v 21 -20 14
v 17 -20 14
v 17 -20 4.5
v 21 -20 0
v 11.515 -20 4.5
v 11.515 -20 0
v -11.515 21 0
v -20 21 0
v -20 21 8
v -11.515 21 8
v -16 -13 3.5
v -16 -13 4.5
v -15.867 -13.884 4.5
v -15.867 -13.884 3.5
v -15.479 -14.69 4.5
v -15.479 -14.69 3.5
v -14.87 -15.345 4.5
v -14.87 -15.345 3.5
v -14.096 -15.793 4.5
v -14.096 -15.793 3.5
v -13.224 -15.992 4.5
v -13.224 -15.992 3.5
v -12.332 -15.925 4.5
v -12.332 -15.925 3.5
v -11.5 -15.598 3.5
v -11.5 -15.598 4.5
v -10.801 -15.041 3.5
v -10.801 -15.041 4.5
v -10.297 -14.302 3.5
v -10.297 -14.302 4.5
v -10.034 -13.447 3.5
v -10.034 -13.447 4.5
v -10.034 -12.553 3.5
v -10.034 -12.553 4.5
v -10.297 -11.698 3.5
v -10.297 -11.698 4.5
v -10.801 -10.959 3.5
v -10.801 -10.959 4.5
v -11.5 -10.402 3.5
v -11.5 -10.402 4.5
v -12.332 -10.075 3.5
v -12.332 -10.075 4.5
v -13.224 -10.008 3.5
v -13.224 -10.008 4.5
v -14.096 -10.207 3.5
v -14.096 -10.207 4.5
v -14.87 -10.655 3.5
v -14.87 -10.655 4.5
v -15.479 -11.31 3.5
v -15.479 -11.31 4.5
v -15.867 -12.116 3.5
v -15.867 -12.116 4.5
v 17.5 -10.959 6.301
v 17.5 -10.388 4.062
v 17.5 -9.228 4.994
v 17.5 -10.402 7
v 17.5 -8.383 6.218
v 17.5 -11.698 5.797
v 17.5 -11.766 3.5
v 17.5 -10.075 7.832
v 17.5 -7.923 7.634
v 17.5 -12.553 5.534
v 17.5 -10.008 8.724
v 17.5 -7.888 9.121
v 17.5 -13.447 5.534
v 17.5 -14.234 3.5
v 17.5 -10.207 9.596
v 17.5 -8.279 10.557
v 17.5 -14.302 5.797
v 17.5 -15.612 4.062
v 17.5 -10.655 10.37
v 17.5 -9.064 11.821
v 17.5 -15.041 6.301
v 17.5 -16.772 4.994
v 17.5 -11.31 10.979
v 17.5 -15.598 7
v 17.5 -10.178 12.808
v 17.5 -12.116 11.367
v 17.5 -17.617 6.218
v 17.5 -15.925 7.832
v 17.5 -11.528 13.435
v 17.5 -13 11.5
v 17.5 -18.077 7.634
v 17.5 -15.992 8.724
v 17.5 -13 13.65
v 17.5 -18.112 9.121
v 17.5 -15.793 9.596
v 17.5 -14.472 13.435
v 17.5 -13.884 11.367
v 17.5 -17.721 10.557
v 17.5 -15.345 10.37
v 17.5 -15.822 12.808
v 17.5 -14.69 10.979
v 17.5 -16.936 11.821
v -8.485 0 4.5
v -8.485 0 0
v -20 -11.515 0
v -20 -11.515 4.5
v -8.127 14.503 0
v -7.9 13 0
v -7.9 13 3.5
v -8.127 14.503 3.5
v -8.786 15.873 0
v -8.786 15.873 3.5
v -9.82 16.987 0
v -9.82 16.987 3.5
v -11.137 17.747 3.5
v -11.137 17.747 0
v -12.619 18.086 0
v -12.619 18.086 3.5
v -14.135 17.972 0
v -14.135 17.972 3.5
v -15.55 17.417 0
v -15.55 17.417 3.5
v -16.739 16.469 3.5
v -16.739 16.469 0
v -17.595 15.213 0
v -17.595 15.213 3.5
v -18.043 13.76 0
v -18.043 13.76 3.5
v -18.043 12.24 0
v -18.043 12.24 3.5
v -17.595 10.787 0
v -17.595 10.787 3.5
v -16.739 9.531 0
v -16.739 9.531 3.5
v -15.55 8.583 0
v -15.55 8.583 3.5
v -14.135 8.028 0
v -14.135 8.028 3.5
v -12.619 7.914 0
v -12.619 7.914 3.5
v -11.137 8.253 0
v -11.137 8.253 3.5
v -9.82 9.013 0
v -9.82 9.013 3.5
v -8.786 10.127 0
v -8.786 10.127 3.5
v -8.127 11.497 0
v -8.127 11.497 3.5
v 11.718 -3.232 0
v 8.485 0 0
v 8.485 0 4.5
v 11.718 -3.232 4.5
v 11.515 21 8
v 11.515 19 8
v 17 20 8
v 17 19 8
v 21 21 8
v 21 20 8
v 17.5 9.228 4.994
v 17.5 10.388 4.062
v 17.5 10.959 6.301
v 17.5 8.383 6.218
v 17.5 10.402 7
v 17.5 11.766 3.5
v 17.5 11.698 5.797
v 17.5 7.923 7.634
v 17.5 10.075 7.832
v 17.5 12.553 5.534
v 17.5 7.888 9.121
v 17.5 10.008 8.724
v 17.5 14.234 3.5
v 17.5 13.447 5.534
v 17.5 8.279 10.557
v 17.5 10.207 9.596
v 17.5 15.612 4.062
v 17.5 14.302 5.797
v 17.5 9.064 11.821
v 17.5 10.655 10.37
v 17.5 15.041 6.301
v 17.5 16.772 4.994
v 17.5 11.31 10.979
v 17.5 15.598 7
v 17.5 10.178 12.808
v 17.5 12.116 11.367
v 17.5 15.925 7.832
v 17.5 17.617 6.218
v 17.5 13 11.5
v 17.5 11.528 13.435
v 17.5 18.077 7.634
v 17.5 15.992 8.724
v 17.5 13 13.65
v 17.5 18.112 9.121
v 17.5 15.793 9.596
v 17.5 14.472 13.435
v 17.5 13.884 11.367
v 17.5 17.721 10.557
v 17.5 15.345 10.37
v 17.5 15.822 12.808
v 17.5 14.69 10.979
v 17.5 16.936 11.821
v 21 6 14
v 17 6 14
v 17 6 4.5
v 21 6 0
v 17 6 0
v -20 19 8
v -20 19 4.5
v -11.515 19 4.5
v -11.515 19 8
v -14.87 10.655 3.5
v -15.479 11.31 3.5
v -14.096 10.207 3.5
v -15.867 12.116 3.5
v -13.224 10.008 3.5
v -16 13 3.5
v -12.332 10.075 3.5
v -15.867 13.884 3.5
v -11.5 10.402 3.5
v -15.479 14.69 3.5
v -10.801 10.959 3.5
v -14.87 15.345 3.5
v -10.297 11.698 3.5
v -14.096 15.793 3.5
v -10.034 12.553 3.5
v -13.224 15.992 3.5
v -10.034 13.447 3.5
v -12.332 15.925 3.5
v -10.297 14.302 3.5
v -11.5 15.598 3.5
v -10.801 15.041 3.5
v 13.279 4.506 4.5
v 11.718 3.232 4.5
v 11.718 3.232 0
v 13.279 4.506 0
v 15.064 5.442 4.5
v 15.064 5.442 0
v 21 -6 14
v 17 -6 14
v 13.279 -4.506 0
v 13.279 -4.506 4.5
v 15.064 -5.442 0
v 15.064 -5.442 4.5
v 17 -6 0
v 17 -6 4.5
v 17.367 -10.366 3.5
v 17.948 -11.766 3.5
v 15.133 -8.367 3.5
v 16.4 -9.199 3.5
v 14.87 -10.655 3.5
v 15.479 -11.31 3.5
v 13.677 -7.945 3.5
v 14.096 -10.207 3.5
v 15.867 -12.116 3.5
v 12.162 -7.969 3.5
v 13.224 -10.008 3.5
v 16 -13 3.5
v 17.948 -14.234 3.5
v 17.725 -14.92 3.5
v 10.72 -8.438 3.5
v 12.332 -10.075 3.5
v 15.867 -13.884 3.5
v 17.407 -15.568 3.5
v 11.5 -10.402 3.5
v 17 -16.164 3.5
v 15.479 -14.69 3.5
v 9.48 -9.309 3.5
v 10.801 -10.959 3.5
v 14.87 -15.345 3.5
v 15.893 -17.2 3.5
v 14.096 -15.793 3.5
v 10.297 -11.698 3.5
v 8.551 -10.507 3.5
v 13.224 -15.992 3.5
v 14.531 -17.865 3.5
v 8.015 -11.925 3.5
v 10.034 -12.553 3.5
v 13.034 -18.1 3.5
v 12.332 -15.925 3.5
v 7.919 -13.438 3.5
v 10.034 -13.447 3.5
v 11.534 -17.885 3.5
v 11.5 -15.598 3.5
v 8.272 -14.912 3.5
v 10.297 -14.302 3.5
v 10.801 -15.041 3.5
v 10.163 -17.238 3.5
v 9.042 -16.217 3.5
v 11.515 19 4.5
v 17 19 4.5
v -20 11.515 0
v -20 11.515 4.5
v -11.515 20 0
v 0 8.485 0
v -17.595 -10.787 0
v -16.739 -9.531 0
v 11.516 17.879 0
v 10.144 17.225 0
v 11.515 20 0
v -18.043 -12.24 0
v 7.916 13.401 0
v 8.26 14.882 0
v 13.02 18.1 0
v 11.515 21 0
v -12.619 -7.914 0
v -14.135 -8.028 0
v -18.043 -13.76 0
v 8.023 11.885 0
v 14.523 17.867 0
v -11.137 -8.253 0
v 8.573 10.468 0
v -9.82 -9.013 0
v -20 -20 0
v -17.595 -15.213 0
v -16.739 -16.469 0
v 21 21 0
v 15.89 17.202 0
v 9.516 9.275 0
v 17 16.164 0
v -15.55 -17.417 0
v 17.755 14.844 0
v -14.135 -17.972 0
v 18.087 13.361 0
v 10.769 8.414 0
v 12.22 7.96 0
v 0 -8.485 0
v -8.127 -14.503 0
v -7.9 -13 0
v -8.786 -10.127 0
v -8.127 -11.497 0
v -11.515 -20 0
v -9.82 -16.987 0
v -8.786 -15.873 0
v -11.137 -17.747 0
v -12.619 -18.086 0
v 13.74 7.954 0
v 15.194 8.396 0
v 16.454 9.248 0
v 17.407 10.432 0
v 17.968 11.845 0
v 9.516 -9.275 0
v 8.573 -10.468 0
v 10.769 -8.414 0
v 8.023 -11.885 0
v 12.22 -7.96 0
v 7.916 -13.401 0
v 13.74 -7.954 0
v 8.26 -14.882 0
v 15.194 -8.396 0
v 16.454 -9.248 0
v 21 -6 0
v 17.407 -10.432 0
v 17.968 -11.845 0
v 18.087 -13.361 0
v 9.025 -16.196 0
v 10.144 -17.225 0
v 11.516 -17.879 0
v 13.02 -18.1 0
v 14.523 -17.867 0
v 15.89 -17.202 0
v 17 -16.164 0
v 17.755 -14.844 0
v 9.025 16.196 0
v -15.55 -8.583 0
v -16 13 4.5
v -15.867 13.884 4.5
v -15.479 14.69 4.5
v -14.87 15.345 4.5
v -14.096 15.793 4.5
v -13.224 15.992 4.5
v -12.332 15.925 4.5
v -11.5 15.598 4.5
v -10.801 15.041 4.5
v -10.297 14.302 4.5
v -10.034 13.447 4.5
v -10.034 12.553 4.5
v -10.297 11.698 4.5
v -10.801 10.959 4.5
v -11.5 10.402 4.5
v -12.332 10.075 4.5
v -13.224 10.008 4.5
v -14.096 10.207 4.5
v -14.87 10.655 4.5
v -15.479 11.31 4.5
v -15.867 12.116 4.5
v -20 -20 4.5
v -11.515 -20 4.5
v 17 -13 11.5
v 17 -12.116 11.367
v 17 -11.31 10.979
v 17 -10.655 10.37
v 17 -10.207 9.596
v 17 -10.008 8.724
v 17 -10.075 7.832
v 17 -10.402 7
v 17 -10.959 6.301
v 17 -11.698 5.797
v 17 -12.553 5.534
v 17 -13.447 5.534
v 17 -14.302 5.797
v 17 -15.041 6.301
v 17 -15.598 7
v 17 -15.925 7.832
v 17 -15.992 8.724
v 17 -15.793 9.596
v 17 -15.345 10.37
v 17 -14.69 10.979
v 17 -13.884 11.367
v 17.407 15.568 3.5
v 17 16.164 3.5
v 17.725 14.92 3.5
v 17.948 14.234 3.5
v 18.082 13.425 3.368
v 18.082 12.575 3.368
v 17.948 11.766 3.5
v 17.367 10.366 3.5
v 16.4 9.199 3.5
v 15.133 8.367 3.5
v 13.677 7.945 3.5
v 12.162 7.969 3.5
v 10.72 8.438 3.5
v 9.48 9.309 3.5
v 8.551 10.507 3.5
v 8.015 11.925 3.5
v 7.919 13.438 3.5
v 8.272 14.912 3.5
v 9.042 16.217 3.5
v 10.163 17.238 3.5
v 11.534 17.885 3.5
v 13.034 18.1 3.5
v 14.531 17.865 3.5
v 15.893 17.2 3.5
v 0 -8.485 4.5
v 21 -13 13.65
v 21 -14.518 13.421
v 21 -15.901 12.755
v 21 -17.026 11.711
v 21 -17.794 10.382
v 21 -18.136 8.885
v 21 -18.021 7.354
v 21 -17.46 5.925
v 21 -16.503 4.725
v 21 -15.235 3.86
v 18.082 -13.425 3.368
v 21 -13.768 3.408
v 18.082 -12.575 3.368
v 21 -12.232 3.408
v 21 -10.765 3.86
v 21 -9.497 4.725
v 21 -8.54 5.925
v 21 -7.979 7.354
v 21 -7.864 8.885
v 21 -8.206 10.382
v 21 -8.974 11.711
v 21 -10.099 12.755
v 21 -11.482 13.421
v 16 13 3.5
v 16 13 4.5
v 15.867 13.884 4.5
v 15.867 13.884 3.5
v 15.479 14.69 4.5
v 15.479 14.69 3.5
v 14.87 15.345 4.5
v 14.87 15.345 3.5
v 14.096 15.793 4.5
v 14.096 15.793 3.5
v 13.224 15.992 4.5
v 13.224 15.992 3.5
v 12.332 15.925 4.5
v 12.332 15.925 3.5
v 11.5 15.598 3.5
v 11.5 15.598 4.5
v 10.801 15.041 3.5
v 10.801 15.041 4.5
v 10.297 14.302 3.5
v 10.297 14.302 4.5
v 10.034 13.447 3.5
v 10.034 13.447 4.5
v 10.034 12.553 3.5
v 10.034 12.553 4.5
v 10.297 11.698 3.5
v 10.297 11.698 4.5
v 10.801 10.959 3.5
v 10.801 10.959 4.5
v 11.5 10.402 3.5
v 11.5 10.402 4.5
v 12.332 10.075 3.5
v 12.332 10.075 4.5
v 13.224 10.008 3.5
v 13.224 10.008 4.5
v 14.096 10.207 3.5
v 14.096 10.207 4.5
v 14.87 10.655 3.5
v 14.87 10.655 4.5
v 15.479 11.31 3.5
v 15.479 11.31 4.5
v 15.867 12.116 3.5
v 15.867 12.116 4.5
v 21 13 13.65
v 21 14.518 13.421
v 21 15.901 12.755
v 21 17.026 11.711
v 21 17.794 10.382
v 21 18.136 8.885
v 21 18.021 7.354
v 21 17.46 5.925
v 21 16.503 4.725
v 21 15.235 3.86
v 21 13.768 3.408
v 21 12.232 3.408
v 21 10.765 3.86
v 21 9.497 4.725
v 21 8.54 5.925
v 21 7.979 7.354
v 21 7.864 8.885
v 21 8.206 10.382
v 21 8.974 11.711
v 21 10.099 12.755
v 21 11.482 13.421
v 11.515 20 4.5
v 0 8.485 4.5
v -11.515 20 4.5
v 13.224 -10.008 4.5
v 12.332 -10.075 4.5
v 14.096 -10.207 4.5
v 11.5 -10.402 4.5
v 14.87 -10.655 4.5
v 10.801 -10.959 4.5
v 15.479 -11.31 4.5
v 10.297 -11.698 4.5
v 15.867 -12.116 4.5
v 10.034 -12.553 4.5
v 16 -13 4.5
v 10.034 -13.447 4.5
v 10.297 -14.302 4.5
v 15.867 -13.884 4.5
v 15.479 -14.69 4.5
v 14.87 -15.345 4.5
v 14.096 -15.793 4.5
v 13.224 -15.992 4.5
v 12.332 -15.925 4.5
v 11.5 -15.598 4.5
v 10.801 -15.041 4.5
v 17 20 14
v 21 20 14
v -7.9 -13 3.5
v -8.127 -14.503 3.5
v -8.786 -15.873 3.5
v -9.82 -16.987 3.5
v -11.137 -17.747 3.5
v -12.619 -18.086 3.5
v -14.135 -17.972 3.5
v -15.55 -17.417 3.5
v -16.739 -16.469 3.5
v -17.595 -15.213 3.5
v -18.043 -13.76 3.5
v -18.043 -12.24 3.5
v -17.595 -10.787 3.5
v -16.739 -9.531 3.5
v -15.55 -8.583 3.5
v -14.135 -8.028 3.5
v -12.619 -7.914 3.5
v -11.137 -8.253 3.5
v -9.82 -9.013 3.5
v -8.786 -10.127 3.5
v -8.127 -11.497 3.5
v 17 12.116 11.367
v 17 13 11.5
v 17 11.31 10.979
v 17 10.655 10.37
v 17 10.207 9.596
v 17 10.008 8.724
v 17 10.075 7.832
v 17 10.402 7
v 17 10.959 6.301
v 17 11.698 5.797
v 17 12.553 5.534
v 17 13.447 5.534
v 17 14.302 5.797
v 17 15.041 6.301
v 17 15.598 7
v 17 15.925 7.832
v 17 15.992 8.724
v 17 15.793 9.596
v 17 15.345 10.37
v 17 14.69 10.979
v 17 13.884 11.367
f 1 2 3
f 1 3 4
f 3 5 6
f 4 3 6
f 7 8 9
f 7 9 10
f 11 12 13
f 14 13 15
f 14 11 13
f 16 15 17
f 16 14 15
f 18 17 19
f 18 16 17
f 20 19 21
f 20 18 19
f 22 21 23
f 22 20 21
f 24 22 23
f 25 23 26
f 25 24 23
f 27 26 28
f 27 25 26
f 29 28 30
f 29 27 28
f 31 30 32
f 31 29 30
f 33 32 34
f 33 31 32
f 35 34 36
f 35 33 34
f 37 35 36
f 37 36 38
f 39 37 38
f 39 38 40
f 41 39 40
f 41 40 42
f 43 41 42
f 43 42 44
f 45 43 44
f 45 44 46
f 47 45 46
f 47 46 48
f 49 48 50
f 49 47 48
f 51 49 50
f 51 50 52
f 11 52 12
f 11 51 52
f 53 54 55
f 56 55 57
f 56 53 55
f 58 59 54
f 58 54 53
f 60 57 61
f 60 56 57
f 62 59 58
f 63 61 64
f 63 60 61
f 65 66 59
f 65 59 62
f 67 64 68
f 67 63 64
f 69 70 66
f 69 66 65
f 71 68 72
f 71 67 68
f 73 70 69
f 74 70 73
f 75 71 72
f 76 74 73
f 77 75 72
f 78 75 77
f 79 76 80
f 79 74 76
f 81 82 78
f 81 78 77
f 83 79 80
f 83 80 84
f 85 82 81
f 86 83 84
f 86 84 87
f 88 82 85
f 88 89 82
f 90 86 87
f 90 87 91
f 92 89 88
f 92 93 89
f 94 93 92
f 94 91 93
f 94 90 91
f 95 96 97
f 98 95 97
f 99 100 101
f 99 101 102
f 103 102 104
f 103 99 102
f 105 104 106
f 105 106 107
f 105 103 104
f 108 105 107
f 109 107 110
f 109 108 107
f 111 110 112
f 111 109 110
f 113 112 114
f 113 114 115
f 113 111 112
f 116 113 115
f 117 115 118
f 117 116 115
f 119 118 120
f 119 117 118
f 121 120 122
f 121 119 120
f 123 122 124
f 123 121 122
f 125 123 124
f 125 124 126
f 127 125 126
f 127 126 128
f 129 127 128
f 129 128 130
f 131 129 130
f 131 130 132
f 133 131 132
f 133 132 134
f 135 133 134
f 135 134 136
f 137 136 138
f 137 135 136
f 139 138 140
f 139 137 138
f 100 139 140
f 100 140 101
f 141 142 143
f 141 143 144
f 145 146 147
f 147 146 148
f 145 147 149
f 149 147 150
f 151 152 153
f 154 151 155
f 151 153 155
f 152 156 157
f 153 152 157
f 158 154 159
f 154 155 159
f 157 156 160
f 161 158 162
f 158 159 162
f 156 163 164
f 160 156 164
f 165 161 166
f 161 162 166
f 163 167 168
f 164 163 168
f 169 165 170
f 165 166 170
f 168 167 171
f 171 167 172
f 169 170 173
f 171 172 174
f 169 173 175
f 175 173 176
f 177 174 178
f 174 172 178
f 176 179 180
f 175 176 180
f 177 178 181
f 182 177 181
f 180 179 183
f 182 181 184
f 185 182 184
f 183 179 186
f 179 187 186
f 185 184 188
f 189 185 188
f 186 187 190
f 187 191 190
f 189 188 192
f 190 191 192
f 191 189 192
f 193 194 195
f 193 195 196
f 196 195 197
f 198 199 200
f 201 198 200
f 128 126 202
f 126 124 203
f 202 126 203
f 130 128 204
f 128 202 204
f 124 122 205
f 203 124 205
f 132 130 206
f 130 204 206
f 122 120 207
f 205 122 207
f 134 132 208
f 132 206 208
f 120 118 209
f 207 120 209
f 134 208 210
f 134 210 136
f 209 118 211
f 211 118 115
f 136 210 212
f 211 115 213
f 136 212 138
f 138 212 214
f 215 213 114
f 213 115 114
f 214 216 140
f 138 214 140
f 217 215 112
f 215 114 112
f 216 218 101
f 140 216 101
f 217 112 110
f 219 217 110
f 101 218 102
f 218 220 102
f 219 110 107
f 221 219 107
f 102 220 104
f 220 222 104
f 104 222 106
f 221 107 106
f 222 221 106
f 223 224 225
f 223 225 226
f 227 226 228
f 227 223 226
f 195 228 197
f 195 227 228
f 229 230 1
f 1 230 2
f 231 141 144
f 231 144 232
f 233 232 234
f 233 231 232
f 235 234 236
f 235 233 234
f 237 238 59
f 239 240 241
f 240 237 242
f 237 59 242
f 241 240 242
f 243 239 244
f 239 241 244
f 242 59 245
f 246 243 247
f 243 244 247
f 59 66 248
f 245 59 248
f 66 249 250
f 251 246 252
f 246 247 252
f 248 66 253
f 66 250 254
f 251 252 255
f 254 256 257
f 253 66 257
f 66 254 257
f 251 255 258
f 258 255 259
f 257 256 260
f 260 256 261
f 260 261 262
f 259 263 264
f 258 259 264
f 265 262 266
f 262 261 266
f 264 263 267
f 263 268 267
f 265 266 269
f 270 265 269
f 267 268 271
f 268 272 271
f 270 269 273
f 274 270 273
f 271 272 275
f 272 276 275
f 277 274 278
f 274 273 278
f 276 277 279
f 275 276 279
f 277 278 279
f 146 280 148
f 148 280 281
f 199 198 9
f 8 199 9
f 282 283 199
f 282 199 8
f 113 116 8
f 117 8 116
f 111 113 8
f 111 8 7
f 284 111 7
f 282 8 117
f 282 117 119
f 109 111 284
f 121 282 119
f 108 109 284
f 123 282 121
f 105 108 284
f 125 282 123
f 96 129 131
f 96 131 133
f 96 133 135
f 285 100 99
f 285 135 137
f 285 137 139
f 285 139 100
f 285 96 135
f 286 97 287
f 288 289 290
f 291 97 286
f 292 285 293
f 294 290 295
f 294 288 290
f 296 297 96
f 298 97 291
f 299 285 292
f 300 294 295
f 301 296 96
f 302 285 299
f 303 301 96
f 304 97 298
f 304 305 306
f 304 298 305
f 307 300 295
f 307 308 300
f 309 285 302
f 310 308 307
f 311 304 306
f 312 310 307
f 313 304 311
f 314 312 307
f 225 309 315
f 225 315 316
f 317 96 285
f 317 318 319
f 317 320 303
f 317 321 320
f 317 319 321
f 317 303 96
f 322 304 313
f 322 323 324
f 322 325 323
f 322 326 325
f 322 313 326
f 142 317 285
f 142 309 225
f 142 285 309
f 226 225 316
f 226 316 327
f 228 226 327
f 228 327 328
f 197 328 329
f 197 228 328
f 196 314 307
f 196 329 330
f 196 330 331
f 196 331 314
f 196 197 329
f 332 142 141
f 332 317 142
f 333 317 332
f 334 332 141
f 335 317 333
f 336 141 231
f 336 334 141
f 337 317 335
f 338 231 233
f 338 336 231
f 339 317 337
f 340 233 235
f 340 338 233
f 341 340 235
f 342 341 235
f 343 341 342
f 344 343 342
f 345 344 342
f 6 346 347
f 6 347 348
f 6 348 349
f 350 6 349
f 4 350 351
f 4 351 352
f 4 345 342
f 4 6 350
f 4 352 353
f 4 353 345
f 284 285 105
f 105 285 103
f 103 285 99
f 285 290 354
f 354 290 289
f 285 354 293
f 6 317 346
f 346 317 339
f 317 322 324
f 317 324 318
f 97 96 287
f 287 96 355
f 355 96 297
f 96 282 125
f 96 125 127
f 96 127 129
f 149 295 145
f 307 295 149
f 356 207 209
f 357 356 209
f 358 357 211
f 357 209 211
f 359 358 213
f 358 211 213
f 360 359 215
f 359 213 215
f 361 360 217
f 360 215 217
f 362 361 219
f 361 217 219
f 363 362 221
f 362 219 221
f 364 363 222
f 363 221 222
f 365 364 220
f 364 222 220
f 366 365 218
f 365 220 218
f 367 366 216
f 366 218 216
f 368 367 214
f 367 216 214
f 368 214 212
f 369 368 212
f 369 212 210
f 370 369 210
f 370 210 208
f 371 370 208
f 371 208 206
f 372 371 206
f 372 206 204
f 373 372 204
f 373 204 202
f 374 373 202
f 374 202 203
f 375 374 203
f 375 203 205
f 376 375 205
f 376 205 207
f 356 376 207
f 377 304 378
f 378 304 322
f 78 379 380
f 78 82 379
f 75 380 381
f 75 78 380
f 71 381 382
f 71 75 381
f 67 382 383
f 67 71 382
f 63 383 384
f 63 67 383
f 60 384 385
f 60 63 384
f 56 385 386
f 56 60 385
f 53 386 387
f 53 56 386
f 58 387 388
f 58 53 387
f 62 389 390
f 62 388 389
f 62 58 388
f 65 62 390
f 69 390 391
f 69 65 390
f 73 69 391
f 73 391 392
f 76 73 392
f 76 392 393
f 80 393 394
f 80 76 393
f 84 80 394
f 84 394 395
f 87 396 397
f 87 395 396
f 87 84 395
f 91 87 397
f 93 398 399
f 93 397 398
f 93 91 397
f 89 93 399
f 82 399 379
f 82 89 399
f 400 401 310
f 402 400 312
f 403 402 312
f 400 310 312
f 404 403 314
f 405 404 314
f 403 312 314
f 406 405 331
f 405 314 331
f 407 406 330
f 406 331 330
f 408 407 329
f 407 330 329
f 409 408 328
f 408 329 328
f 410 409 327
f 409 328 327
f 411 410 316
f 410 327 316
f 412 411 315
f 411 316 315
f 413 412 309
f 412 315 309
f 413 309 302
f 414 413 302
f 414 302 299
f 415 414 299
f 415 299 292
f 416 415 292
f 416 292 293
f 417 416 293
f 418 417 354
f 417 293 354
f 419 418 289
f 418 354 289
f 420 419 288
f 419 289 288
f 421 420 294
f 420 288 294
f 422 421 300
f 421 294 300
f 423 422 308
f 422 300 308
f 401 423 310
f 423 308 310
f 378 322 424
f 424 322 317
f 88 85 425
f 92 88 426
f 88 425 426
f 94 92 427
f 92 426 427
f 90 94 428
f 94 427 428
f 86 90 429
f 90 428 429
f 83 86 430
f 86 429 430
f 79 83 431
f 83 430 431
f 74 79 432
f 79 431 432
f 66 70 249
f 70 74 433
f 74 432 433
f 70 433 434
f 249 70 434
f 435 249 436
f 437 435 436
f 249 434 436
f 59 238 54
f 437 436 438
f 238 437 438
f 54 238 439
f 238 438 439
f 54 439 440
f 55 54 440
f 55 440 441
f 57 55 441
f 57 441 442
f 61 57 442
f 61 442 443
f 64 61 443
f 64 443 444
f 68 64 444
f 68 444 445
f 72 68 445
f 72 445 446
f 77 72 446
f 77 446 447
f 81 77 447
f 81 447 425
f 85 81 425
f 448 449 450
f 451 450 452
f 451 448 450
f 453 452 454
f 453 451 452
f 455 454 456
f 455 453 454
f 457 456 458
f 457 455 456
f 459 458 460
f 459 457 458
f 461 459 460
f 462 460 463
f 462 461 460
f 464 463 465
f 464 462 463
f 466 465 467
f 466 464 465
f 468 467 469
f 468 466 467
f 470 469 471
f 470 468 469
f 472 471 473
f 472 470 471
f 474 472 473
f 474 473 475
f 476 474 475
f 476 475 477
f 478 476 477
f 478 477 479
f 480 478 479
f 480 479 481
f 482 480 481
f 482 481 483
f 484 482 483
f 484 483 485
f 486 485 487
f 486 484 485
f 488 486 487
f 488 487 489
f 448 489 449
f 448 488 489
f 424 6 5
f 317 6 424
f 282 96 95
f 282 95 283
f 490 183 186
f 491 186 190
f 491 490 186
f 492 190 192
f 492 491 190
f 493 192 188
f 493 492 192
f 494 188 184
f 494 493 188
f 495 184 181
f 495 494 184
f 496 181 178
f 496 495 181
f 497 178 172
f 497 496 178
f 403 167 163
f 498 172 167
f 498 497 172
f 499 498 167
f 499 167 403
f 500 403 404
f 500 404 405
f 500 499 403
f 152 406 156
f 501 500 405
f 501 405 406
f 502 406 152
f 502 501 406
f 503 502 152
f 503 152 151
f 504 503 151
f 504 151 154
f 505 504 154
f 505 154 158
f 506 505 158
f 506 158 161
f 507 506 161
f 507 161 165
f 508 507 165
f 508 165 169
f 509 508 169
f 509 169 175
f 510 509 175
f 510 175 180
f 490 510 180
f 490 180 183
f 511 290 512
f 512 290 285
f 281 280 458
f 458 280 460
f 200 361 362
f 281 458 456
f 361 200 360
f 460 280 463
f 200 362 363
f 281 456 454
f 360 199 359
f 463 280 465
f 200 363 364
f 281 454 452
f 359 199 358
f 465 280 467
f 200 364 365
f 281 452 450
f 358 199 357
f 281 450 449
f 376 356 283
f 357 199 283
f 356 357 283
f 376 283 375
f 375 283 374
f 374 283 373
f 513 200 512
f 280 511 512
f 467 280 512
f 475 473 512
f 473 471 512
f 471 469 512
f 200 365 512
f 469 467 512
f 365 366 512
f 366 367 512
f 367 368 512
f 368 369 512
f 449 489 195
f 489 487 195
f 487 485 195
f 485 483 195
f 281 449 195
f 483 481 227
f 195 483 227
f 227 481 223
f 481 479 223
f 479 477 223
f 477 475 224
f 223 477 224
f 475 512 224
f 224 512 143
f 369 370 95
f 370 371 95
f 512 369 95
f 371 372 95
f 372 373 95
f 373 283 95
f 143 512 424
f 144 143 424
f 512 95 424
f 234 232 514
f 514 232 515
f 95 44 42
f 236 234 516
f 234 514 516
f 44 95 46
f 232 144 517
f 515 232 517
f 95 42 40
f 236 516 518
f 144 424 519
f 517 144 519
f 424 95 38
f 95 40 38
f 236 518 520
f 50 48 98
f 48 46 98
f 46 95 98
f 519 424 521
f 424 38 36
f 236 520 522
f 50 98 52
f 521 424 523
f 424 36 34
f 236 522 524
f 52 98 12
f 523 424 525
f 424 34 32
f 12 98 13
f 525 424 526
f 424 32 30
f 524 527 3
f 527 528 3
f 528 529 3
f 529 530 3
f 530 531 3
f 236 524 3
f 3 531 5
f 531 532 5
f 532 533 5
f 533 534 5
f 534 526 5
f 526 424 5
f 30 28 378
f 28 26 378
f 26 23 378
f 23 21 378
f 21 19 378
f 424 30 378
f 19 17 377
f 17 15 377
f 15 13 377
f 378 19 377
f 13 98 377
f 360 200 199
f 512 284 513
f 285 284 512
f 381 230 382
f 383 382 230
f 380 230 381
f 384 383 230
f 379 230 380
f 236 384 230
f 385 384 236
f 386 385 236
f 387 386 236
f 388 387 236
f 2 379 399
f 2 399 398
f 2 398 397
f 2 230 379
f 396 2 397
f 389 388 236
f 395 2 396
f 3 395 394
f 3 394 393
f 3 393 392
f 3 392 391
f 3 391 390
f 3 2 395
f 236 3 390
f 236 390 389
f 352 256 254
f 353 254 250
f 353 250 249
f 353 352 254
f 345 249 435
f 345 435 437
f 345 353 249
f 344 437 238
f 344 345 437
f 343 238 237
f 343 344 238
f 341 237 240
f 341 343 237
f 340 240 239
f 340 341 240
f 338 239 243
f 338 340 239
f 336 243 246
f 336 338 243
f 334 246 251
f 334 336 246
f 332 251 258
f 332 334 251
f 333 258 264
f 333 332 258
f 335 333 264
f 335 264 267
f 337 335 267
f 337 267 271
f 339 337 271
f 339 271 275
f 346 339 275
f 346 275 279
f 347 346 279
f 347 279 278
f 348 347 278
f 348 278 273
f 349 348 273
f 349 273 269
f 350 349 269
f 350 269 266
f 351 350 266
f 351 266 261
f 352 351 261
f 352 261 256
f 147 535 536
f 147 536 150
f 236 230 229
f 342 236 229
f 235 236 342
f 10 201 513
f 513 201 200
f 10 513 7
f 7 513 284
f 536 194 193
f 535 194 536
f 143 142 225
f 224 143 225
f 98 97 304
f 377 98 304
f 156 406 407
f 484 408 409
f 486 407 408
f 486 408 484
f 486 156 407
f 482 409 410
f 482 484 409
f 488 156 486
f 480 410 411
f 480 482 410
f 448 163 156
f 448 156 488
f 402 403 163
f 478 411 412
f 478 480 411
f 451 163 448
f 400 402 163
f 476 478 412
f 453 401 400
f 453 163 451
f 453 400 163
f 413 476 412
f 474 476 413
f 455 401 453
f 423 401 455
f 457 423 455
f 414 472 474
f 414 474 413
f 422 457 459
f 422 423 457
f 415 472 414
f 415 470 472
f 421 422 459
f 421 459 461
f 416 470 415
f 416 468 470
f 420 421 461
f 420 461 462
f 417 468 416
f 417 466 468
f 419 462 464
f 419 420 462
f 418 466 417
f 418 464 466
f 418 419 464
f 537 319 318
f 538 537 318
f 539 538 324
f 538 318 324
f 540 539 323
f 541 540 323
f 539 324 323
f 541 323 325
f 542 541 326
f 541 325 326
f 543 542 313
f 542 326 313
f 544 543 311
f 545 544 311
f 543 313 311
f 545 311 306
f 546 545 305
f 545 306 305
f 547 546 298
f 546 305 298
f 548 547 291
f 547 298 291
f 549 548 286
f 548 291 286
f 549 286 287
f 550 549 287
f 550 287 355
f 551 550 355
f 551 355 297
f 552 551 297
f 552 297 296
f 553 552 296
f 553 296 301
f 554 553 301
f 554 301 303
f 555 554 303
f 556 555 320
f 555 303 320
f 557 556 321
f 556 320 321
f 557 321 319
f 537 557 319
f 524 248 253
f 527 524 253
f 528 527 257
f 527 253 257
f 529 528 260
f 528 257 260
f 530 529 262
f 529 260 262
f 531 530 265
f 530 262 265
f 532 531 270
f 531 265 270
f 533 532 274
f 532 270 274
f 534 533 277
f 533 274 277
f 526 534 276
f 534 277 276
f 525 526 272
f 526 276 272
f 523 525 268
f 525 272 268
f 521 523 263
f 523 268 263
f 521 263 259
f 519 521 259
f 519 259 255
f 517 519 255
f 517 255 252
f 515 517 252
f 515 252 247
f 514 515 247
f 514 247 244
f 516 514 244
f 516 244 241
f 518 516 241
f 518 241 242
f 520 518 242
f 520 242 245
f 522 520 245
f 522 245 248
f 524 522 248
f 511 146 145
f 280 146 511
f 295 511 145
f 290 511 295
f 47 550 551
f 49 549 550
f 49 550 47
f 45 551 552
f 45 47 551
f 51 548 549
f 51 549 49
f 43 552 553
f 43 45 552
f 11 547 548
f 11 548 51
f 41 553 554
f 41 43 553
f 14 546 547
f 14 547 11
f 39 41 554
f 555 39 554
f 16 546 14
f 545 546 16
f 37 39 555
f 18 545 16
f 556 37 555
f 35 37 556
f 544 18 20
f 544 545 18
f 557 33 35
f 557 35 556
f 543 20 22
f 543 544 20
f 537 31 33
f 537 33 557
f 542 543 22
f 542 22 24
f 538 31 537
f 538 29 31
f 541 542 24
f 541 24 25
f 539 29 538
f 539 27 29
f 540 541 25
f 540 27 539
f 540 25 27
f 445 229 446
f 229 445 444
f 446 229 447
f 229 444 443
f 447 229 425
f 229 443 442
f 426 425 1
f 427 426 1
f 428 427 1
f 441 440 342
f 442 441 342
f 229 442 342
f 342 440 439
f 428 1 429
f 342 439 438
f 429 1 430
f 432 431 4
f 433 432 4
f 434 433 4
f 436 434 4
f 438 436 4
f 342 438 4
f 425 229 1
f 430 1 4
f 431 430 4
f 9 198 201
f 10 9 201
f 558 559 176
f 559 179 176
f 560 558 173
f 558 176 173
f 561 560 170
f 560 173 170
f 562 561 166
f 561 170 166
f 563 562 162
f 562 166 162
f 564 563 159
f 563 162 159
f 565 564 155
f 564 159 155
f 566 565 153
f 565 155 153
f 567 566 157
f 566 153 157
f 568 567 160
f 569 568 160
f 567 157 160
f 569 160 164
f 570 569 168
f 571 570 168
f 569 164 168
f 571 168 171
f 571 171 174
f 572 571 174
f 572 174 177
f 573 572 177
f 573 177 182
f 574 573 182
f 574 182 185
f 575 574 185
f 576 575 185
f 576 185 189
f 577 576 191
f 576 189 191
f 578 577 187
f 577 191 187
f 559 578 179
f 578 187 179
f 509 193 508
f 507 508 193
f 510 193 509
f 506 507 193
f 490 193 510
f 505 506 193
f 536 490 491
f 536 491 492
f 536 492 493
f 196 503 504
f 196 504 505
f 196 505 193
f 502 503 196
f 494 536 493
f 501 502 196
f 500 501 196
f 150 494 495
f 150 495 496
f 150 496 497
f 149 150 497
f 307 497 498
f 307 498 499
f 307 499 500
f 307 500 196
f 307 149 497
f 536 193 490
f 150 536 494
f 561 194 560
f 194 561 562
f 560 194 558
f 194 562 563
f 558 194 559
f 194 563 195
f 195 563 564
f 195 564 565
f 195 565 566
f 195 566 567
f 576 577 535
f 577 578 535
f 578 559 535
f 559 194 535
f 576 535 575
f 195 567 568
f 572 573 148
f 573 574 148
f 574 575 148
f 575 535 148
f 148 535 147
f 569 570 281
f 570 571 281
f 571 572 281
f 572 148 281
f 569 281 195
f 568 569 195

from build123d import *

# Parameters (mm, degrees)
RESSALTO_EXTRUS_O1_DEPTH      = 4.5
CORTE_EXTRUS_O1_START         = -4.5
ESBO_O2_R                     = 5.1
CORTE_EXTRUS_O1_DEPTH         = 3.5
ESBO_O3_R                     = 3
CORTE_EXTRUS_O2_DEPTH         = 3.5
ESPELHAR2_COPY_1_DEPTH        = 4.5
ESPELHAR2_START               = -4.5
ESPELHAR2_COPY_2_SKETCH_R     = 5.1
ESPELHAR2_COPY_2_DEPTH        = 3.5
ESPELHAR2_COPY_3_SKETCH_R     = 3
ESPELHAR2_COPY_3_DEPTH        = 3.5
RESSALTO_EXTRUS_O2_START      = -3
ESBO_O5_W                     = 14
ESBO_O5_H                     = 14
RESSALTO_EXTRUS_O2_DEPTH      = 4
ESBO_O6_R                     = 5.15
CORTE_EXTRUS_O3_DEPTH         = 3.5
ESBO_O7_R                     = 3
CORTE_EXTRUS_O4_DEPTH         = 45.746508244
FILETE1_R                     = 10
RESSALTO_EXTRUS_O3_DEPTH      = 1
RESSALTO_EXTRUS_O3_DEPTH_BACK = 1
ESBO_O8_W                     = 8.485281374
ESBO_O8_H                     = 8
ESBO_O8_W_2                   = 9.485281374
ESPELHAR5_START               = -4.5
ESPELHAR5_COPY_1_SKETCH_R     = 5.1
ESPELHAR5_COPY_1_DEPTH        = 3.5
ESPELHAR5_COPY_2_SKETCH_R     = 5.1
ESPELHAR5_COPY_2_DEPTH        = 3.5


with BuildPart() as part:
    # Esboço1 → Ressalto-extrusão1 (new body)
    with BuildSketch(Plane.XY):
        Polygon((-8.485281374, 0), (-20, 11.514718626), (-20, 20), (-11.514718626, 20), (0, 8.485281374), (0, 0), align=None)
    ressalto_extrus_o1 = extrude(amount=RESSALTO_EXTRUS_O1_DEPTH)

    # Esboço2 → Corte-extrusão1 (cut)
    with BuildSketch(Plane.XY.offset(4.5).offset(CORTE_EXTRUS_O1_START)):
        with Locations((-13, 13)):
            Circle(ESBO_O2_R)
    corte_extrus_o1 = extrude(amount=CORTE_EXTRUS_O1_DEPTH, mode=Mode.SUBTRACT)

    # Esboço3 → Corte-extrusão2 (cut)
    with BuildSketch(Plane(origin=(0, 0, 3.5), x_dir=(-1, 0, 0), z_dir=(0, 0, -1))):
        with Locations((13, 13)):
            Circle(ESBO_O3_R)
    corte_extrus_o2 = extrude(amount=-CORTE_EXTRUS_O2_DEPTH, mode=Mode.SUBTRACT)

    # Espelhar1: Ressalto-extrusão1, Corte-extrusão1, Corte-extrusão2 across plane
    add(ressalto_extrus_o1.mirror(Plane(origin=(0, 0, 0), x_dir=(0, 0, 1), z_dir=(1, 0, 0))))
    add(corte_extrus_o1.mirror(Plane(origin=(0, 0, 0), x_dir=(0, 0, 1), z_dir=(1, 0, 0))), mode=Mode.SUBTRACT)
    add(corte_extrus_o2.mirror(Plane(origin=(0, 0, 0), x_dir=(0, 0, 1), z_dir=(1, 0, 0))), mode=Mode.SUBTRACT)

    # Espelhar2: Ressalto-extrusão1, Corte-extrusão1, Corte-extrusão2 across plane
    add(ressalto_extrus_o1.mirror(Plane.ZX))
    add(corte_extrus_o1.mirror(Plane.ZX), mode=Mode.SUBTRACT)
    add(corte_extrus_o2.mirror(Plane.ZX), mode=Mode.SUBTRACT)

    # Espelhar2 copy 1 sketch → Espelhar2 copy 1 (add)
    with BuildSketch(Plane(origin=(0, 0, 0), x_dir=(-1, 0, 0), z_dir=(0, 0, 1))):
        Polygon((-8.485281374, 0), (-20, 11.514718626), (-20, 20), (-11.514718626, 20), (0, 8.485281374), (0, 0), align=None)
    extrude(amount=ESPELHAR2_COPY_1_DEPTH)

    # Espelhar2 copy 2 sketch → Espelhar2 copy 2 (cut)
    with BuildSketch(Plane(origin=(0, 0, 4.5), x_dir=(-1, 0, 0), z_dir=(0, 0, 1)).offset(ESPELHAR2_START)):
        with Locations((-13, 13)):
            Circle(ESPELHAR2_COPY_2_SKETCH_R)
    extrude(amount=ESPELHAR2_COPY_2_DEPTH, mode=Mode.SUBTRACT)

    # Espelhar2 copy 3 sketch → Espelhar2 copy 3 (cut)
    with BuildSketch(Plane(origin=(0, 0, 3.5), x_dir=(1, 0, 0), z_dir=(0, 0, -1))):
        with Locations((13, 13)):
            Circle(ESPELHAR2_COPY_3_SKETCH_R)
    extrude(amount=-ESPELHAR2_COPY_3_DEPTH, mode=Mode.SUBTRACT)

    # Esboço5 → Ressalto-extrusão2 (add)
    with BuildSketch(Plane(origin=(20, 0, 0), x_dir=(0, 0, -1), z_dir=(1, 0, 0)).offset(RESSALTO_EXTRUS_O2_START)):
        with Locations((-7, 13)):
            Rectangle(ESBO_O5_W, ESBO_O5_H)
    ressalto_extrus_o2 = extrude(amount=RESSALTO_EXTRUS_O2_DEPTH)

    # Esboço6 → Corte-extrusão3 (cut)
    with BuildSketch(Plane.ZY.offset(-21)):
        with Locations((8.5, 13)):
            Circle(ESBO_O6_R)
    corte_extrus_o3 = extrude(amount=CORTE_EXTRUS_O3_DEPTH, mode=Mode.SUBTRACT)

    # Esboço7 → Corte-extrusão4 (cut, symmetric)
    with BuildSketch(Plane(origin=(17.5, 0, 0), x_dir=(0, 0, -1), z_dir=(1, 0, 0))):
        with Locations(Location((-8.5, 13, 0), (0, 0, 180))):
            Circle(ESBO_O7_R)
    corte_extrus_o4 = extrude(amount=CORTE_EXTRUS_O4_DEPTH, both=True, mode=Mode.SUBTRACT)

    # Espelhar3: Ressalto-extrusão2, Corte-extrusão3, Corte-extrusão4 across plane
    add(ressalto_extrus_o2.mirror(Plane.ZX))
    add(corte_extrus_o3.mirror(Plane.ZX), mode=Mode.SUBTRACT)
    add(corte_extrus_o4.mirror(Plane.ZX), mode=Mode.SUBTRACT)

    # Filete1
    # the kernel refuses this fillet: 10 mm, written as the material it adds along each edge
    with BuildSketch(Plane(origin=(17, 8.514718626, 4.5), x_dir=(0, -1, 0), z_dir=(0, 0, -1))) as filete1_piece_1:
        with BuildLine():
            CenterArc((12.353448055, -1.788687569), FILETE1_R, 135, 34.696124969)
            Line((5.282380243, 5.282380243), (0, 0))
            Line((0, 0), (2.514718626, 0))
        make_face()
    extrude(amount=4.5)
    with BuildSketch(Plane(origin=(17, -8.514718626, 0), x_dir=(-0.7071067811865464, 0.7071067811865487, 0), z_dir=(0, 0, 1))) as filete1_piece_2:
        with BuildLine():
            CenterArc((7.470413781, -10), FILETE1_R, 90, 34.696124969)
            Line((1.778174593, -1.778174593), (0, 0))
            Line((0, 0), (7.470413781, 0))
        make_face()
    extrude(amount=4.5)

    # Esboço8 → Ressalto-extrusão3 (add, two sides: drawn at the far end of the back side and taken through both)
    with BuildSketch(Plane(origin=(0, 20, 0), x_dir=(1, 0, 0), z_dir=(0, 1, 0)).offset(-RESSALTO_EXTRUS_O3_DEPTH_BACK)):
        with Locations((-15.757359313, -4)):
            Rectangle(ESBO_O8_W, ESBO_O8_H)
        with Locations((16.257359313, -4)):
            Rectangle(ESBO_O8_W_2, ESBO_O8_H)
    extrude(amount=RESSALTO_EXTRUS_O3_DEPTH + RESSALTO_EXTRUS_O3_DEPTH_BACK)

    # Espelhar4: Corte-extrusão1 across plane
    add(corte_extrus_o1.mirror(Plane(origin=(0, 0, 0), x_dir=(0, 0, 1), z_dir=(1, 0, 0))), mode=Mode.SUBTRACT)

    # Espelhar5 copy 1 sketch → Espelhar5 copy 1 (cut)
    with BuildSketch(Plane(origin=(0, 0, 4.5), x_dir=(-1, 0, 0), z_dir=(0, 0, 1)).offset(ESPELHAR5_START)):
        with Locations((-13, 13)):
            Circle(ESPELHAR5_COPY_1_SKETCH_R)
    extrude(amount=ESPELHAR5_COPY_1_DEPTH, mode=Mode.SUBTRACT)

    # Espelhar5 copy 2 sketch → Espelhar5 copy 2 (cut)
    with BuildSketch(Plane.XY.offset(4.5).offset(ESPELHAR5_START)):
        with Locations((-13, -13)):
            Circle(ESPELHAR5_COPY_2_SKETCH_R)
    extrude(amount=ESPELHAR5_COPY_2_DEPTH, mode=Mode.SUBTRACT)


solid = part.part
